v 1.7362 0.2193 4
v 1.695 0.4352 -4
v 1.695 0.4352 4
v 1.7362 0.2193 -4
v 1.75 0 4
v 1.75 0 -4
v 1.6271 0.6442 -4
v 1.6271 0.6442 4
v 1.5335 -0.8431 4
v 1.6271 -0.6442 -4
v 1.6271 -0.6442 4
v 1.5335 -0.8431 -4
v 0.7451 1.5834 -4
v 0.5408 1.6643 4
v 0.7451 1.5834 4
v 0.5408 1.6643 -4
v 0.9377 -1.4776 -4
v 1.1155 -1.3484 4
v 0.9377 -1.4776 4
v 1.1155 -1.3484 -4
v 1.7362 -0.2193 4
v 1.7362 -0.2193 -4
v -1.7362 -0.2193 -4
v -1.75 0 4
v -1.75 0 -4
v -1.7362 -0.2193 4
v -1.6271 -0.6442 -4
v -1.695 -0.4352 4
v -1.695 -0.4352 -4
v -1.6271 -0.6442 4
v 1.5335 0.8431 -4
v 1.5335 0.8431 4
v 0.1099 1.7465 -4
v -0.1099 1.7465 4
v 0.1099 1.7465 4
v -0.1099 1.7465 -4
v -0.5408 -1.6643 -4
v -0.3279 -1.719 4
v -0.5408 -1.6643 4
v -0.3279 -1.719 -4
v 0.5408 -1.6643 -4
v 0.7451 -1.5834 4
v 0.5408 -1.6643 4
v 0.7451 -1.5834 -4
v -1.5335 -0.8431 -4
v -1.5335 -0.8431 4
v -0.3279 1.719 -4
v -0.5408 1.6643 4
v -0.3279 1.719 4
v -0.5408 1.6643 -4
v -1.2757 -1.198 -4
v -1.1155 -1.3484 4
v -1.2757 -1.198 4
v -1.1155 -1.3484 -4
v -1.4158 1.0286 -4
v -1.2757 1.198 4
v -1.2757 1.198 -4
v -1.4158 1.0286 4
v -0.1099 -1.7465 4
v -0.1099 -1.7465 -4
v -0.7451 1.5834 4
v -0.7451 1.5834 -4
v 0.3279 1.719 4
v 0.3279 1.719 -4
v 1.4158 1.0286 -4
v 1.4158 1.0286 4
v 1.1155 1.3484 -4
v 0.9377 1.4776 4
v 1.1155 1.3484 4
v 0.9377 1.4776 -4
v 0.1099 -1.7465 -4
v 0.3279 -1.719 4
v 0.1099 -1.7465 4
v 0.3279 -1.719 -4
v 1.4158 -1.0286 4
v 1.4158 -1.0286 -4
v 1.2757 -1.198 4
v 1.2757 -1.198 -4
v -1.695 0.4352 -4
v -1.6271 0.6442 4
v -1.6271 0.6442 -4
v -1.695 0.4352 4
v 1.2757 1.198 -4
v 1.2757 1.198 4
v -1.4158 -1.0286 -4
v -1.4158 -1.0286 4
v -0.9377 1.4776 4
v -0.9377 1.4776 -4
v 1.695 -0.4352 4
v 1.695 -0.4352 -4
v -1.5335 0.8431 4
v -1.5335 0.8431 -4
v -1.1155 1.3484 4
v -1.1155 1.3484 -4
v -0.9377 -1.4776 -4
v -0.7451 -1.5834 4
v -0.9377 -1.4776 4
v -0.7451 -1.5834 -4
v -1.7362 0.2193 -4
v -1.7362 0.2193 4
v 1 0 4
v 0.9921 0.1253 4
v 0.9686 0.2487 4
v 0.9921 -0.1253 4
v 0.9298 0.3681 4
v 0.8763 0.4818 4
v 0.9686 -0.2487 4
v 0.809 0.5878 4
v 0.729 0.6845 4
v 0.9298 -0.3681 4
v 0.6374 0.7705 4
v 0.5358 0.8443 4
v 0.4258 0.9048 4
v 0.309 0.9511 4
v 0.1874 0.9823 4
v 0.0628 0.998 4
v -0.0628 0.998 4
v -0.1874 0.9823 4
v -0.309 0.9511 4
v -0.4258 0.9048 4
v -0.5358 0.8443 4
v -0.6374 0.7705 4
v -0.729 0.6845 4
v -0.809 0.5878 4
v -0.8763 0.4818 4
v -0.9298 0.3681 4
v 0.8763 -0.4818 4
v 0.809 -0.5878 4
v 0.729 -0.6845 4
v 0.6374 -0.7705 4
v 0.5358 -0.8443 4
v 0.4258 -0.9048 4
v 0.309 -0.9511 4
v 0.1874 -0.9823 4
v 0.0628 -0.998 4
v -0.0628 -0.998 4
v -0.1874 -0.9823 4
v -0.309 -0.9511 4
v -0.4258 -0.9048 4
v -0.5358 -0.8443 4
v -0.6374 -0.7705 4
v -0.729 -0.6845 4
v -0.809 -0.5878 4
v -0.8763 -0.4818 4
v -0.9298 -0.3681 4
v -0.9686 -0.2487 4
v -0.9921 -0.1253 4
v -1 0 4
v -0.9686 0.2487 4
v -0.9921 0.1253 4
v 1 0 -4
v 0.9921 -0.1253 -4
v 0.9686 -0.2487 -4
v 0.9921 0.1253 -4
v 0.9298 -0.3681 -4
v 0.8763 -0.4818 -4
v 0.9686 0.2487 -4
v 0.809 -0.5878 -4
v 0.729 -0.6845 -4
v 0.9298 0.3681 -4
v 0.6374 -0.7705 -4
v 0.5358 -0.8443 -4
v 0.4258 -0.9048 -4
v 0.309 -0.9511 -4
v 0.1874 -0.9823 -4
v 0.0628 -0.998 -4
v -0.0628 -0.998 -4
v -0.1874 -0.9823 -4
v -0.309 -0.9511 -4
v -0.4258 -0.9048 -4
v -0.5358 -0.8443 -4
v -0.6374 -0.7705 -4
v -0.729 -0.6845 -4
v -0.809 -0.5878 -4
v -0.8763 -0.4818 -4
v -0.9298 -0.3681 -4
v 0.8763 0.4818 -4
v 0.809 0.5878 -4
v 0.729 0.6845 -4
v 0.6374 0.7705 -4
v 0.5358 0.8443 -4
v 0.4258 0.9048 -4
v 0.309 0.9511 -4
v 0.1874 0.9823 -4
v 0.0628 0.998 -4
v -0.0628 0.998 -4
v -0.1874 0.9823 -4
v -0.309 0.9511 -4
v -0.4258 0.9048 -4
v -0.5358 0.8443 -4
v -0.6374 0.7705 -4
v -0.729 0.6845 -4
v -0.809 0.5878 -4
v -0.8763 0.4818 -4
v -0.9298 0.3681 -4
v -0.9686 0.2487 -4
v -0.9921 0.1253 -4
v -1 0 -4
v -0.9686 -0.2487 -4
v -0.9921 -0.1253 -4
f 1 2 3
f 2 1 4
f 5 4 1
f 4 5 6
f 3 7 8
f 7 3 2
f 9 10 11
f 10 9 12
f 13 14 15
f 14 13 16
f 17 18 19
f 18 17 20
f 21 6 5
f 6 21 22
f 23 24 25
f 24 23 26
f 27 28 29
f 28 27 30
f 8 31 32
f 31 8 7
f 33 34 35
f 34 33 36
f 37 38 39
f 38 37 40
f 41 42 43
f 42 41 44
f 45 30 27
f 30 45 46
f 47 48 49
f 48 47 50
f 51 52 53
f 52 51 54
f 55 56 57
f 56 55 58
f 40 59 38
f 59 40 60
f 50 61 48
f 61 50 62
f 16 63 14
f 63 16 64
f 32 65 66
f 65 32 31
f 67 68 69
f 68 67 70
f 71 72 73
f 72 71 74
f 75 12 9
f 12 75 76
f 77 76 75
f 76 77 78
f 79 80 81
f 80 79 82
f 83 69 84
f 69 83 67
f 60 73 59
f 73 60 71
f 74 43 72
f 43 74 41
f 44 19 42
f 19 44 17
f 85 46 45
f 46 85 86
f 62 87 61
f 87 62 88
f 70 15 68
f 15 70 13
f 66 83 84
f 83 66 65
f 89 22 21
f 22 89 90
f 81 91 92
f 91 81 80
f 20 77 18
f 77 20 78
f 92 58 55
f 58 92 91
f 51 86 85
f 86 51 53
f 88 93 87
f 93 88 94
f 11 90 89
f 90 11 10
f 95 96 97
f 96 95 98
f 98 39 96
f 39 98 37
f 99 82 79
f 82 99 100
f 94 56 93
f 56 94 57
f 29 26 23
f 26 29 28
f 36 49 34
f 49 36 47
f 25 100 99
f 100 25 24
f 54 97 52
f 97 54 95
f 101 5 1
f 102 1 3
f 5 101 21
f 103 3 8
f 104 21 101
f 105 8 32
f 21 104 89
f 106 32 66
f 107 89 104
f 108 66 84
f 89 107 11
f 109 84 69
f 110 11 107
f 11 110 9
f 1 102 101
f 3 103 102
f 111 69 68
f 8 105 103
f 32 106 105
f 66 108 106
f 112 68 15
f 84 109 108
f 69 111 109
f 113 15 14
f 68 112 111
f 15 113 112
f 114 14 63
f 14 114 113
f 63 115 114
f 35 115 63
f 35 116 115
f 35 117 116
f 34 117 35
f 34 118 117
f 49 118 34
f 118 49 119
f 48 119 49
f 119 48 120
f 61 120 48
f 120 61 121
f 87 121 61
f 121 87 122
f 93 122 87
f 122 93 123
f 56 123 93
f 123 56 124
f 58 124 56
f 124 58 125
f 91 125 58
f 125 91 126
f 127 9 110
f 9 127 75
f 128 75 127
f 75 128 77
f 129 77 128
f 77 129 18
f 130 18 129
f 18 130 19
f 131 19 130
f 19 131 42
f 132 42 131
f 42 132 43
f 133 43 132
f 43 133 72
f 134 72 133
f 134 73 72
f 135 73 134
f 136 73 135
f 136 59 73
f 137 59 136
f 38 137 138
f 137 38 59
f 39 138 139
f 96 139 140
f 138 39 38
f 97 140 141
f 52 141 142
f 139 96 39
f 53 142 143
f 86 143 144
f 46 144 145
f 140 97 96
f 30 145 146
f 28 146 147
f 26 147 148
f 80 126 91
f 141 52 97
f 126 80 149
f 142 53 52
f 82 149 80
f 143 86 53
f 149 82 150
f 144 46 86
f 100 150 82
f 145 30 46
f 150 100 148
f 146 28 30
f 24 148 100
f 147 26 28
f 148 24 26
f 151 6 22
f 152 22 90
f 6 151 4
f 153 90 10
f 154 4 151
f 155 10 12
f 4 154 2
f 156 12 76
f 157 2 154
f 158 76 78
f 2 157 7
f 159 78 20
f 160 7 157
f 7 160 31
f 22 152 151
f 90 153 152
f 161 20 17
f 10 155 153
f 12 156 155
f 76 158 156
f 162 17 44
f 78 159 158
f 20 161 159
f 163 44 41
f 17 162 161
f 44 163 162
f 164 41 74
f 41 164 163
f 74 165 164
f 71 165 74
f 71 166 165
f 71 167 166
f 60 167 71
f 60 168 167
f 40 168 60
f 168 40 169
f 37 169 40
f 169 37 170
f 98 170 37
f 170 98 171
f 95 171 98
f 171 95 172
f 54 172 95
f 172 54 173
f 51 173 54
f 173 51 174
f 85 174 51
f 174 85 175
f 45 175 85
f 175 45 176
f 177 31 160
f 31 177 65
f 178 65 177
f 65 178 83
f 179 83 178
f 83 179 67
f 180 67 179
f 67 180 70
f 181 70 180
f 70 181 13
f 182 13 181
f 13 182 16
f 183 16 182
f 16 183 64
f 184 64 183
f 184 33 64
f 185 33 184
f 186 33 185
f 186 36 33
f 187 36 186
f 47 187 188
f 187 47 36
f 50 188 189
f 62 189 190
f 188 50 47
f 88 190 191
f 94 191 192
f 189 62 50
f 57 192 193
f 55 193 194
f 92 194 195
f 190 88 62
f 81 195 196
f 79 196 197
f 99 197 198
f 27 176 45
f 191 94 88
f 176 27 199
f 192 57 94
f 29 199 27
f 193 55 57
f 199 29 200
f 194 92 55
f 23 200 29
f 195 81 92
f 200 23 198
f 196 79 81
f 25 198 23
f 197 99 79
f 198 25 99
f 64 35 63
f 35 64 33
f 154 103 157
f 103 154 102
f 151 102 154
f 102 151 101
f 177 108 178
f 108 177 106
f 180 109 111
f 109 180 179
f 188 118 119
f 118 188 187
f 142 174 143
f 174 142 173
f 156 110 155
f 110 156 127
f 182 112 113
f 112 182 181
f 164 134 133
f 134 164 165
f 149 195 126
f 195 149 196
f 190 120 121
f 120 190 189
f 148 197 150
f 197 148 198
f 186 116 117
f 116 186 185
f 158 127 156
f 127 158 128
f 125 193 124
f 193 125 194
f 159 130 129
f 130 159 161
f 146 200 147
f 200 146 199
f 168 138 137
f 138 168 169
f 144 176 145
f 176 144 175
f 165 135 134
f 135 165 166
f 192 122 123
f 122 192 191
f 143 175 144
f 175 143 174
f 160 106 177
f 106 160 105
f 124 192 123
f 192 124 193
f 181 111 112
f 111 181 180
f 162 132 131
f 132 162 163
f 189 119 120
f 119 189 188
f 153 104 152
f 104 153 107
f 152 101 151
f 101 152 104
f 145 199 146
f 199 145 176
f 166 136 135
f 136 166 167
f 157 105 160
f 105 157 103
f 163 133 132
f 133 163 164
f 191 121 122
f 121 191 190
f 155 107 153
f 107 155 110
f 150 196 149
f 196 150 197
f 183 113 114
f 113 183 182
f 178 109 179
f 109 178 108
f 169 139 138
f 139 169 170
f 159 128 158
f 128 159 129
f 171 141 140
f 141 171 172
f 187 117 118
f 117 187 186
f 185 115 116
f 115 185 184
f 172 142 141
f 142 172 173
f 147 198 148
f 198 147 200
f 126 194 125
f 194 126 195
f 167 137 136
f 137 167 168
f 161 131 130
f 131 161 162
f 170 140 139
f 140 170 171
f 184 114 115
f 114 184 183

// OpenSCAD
$fn = 50;


difference() {
	union() {
		translate(v = [0, 0, -4.0000000000]) {
			cylinder(h = 8, r = 1.7500000000);
		}
	}
	union() {
		translate(v = [0, 0, -100.0000000000]) {
			cylinder(h = 200, r = 1.0000000000);
		}
	}
}
